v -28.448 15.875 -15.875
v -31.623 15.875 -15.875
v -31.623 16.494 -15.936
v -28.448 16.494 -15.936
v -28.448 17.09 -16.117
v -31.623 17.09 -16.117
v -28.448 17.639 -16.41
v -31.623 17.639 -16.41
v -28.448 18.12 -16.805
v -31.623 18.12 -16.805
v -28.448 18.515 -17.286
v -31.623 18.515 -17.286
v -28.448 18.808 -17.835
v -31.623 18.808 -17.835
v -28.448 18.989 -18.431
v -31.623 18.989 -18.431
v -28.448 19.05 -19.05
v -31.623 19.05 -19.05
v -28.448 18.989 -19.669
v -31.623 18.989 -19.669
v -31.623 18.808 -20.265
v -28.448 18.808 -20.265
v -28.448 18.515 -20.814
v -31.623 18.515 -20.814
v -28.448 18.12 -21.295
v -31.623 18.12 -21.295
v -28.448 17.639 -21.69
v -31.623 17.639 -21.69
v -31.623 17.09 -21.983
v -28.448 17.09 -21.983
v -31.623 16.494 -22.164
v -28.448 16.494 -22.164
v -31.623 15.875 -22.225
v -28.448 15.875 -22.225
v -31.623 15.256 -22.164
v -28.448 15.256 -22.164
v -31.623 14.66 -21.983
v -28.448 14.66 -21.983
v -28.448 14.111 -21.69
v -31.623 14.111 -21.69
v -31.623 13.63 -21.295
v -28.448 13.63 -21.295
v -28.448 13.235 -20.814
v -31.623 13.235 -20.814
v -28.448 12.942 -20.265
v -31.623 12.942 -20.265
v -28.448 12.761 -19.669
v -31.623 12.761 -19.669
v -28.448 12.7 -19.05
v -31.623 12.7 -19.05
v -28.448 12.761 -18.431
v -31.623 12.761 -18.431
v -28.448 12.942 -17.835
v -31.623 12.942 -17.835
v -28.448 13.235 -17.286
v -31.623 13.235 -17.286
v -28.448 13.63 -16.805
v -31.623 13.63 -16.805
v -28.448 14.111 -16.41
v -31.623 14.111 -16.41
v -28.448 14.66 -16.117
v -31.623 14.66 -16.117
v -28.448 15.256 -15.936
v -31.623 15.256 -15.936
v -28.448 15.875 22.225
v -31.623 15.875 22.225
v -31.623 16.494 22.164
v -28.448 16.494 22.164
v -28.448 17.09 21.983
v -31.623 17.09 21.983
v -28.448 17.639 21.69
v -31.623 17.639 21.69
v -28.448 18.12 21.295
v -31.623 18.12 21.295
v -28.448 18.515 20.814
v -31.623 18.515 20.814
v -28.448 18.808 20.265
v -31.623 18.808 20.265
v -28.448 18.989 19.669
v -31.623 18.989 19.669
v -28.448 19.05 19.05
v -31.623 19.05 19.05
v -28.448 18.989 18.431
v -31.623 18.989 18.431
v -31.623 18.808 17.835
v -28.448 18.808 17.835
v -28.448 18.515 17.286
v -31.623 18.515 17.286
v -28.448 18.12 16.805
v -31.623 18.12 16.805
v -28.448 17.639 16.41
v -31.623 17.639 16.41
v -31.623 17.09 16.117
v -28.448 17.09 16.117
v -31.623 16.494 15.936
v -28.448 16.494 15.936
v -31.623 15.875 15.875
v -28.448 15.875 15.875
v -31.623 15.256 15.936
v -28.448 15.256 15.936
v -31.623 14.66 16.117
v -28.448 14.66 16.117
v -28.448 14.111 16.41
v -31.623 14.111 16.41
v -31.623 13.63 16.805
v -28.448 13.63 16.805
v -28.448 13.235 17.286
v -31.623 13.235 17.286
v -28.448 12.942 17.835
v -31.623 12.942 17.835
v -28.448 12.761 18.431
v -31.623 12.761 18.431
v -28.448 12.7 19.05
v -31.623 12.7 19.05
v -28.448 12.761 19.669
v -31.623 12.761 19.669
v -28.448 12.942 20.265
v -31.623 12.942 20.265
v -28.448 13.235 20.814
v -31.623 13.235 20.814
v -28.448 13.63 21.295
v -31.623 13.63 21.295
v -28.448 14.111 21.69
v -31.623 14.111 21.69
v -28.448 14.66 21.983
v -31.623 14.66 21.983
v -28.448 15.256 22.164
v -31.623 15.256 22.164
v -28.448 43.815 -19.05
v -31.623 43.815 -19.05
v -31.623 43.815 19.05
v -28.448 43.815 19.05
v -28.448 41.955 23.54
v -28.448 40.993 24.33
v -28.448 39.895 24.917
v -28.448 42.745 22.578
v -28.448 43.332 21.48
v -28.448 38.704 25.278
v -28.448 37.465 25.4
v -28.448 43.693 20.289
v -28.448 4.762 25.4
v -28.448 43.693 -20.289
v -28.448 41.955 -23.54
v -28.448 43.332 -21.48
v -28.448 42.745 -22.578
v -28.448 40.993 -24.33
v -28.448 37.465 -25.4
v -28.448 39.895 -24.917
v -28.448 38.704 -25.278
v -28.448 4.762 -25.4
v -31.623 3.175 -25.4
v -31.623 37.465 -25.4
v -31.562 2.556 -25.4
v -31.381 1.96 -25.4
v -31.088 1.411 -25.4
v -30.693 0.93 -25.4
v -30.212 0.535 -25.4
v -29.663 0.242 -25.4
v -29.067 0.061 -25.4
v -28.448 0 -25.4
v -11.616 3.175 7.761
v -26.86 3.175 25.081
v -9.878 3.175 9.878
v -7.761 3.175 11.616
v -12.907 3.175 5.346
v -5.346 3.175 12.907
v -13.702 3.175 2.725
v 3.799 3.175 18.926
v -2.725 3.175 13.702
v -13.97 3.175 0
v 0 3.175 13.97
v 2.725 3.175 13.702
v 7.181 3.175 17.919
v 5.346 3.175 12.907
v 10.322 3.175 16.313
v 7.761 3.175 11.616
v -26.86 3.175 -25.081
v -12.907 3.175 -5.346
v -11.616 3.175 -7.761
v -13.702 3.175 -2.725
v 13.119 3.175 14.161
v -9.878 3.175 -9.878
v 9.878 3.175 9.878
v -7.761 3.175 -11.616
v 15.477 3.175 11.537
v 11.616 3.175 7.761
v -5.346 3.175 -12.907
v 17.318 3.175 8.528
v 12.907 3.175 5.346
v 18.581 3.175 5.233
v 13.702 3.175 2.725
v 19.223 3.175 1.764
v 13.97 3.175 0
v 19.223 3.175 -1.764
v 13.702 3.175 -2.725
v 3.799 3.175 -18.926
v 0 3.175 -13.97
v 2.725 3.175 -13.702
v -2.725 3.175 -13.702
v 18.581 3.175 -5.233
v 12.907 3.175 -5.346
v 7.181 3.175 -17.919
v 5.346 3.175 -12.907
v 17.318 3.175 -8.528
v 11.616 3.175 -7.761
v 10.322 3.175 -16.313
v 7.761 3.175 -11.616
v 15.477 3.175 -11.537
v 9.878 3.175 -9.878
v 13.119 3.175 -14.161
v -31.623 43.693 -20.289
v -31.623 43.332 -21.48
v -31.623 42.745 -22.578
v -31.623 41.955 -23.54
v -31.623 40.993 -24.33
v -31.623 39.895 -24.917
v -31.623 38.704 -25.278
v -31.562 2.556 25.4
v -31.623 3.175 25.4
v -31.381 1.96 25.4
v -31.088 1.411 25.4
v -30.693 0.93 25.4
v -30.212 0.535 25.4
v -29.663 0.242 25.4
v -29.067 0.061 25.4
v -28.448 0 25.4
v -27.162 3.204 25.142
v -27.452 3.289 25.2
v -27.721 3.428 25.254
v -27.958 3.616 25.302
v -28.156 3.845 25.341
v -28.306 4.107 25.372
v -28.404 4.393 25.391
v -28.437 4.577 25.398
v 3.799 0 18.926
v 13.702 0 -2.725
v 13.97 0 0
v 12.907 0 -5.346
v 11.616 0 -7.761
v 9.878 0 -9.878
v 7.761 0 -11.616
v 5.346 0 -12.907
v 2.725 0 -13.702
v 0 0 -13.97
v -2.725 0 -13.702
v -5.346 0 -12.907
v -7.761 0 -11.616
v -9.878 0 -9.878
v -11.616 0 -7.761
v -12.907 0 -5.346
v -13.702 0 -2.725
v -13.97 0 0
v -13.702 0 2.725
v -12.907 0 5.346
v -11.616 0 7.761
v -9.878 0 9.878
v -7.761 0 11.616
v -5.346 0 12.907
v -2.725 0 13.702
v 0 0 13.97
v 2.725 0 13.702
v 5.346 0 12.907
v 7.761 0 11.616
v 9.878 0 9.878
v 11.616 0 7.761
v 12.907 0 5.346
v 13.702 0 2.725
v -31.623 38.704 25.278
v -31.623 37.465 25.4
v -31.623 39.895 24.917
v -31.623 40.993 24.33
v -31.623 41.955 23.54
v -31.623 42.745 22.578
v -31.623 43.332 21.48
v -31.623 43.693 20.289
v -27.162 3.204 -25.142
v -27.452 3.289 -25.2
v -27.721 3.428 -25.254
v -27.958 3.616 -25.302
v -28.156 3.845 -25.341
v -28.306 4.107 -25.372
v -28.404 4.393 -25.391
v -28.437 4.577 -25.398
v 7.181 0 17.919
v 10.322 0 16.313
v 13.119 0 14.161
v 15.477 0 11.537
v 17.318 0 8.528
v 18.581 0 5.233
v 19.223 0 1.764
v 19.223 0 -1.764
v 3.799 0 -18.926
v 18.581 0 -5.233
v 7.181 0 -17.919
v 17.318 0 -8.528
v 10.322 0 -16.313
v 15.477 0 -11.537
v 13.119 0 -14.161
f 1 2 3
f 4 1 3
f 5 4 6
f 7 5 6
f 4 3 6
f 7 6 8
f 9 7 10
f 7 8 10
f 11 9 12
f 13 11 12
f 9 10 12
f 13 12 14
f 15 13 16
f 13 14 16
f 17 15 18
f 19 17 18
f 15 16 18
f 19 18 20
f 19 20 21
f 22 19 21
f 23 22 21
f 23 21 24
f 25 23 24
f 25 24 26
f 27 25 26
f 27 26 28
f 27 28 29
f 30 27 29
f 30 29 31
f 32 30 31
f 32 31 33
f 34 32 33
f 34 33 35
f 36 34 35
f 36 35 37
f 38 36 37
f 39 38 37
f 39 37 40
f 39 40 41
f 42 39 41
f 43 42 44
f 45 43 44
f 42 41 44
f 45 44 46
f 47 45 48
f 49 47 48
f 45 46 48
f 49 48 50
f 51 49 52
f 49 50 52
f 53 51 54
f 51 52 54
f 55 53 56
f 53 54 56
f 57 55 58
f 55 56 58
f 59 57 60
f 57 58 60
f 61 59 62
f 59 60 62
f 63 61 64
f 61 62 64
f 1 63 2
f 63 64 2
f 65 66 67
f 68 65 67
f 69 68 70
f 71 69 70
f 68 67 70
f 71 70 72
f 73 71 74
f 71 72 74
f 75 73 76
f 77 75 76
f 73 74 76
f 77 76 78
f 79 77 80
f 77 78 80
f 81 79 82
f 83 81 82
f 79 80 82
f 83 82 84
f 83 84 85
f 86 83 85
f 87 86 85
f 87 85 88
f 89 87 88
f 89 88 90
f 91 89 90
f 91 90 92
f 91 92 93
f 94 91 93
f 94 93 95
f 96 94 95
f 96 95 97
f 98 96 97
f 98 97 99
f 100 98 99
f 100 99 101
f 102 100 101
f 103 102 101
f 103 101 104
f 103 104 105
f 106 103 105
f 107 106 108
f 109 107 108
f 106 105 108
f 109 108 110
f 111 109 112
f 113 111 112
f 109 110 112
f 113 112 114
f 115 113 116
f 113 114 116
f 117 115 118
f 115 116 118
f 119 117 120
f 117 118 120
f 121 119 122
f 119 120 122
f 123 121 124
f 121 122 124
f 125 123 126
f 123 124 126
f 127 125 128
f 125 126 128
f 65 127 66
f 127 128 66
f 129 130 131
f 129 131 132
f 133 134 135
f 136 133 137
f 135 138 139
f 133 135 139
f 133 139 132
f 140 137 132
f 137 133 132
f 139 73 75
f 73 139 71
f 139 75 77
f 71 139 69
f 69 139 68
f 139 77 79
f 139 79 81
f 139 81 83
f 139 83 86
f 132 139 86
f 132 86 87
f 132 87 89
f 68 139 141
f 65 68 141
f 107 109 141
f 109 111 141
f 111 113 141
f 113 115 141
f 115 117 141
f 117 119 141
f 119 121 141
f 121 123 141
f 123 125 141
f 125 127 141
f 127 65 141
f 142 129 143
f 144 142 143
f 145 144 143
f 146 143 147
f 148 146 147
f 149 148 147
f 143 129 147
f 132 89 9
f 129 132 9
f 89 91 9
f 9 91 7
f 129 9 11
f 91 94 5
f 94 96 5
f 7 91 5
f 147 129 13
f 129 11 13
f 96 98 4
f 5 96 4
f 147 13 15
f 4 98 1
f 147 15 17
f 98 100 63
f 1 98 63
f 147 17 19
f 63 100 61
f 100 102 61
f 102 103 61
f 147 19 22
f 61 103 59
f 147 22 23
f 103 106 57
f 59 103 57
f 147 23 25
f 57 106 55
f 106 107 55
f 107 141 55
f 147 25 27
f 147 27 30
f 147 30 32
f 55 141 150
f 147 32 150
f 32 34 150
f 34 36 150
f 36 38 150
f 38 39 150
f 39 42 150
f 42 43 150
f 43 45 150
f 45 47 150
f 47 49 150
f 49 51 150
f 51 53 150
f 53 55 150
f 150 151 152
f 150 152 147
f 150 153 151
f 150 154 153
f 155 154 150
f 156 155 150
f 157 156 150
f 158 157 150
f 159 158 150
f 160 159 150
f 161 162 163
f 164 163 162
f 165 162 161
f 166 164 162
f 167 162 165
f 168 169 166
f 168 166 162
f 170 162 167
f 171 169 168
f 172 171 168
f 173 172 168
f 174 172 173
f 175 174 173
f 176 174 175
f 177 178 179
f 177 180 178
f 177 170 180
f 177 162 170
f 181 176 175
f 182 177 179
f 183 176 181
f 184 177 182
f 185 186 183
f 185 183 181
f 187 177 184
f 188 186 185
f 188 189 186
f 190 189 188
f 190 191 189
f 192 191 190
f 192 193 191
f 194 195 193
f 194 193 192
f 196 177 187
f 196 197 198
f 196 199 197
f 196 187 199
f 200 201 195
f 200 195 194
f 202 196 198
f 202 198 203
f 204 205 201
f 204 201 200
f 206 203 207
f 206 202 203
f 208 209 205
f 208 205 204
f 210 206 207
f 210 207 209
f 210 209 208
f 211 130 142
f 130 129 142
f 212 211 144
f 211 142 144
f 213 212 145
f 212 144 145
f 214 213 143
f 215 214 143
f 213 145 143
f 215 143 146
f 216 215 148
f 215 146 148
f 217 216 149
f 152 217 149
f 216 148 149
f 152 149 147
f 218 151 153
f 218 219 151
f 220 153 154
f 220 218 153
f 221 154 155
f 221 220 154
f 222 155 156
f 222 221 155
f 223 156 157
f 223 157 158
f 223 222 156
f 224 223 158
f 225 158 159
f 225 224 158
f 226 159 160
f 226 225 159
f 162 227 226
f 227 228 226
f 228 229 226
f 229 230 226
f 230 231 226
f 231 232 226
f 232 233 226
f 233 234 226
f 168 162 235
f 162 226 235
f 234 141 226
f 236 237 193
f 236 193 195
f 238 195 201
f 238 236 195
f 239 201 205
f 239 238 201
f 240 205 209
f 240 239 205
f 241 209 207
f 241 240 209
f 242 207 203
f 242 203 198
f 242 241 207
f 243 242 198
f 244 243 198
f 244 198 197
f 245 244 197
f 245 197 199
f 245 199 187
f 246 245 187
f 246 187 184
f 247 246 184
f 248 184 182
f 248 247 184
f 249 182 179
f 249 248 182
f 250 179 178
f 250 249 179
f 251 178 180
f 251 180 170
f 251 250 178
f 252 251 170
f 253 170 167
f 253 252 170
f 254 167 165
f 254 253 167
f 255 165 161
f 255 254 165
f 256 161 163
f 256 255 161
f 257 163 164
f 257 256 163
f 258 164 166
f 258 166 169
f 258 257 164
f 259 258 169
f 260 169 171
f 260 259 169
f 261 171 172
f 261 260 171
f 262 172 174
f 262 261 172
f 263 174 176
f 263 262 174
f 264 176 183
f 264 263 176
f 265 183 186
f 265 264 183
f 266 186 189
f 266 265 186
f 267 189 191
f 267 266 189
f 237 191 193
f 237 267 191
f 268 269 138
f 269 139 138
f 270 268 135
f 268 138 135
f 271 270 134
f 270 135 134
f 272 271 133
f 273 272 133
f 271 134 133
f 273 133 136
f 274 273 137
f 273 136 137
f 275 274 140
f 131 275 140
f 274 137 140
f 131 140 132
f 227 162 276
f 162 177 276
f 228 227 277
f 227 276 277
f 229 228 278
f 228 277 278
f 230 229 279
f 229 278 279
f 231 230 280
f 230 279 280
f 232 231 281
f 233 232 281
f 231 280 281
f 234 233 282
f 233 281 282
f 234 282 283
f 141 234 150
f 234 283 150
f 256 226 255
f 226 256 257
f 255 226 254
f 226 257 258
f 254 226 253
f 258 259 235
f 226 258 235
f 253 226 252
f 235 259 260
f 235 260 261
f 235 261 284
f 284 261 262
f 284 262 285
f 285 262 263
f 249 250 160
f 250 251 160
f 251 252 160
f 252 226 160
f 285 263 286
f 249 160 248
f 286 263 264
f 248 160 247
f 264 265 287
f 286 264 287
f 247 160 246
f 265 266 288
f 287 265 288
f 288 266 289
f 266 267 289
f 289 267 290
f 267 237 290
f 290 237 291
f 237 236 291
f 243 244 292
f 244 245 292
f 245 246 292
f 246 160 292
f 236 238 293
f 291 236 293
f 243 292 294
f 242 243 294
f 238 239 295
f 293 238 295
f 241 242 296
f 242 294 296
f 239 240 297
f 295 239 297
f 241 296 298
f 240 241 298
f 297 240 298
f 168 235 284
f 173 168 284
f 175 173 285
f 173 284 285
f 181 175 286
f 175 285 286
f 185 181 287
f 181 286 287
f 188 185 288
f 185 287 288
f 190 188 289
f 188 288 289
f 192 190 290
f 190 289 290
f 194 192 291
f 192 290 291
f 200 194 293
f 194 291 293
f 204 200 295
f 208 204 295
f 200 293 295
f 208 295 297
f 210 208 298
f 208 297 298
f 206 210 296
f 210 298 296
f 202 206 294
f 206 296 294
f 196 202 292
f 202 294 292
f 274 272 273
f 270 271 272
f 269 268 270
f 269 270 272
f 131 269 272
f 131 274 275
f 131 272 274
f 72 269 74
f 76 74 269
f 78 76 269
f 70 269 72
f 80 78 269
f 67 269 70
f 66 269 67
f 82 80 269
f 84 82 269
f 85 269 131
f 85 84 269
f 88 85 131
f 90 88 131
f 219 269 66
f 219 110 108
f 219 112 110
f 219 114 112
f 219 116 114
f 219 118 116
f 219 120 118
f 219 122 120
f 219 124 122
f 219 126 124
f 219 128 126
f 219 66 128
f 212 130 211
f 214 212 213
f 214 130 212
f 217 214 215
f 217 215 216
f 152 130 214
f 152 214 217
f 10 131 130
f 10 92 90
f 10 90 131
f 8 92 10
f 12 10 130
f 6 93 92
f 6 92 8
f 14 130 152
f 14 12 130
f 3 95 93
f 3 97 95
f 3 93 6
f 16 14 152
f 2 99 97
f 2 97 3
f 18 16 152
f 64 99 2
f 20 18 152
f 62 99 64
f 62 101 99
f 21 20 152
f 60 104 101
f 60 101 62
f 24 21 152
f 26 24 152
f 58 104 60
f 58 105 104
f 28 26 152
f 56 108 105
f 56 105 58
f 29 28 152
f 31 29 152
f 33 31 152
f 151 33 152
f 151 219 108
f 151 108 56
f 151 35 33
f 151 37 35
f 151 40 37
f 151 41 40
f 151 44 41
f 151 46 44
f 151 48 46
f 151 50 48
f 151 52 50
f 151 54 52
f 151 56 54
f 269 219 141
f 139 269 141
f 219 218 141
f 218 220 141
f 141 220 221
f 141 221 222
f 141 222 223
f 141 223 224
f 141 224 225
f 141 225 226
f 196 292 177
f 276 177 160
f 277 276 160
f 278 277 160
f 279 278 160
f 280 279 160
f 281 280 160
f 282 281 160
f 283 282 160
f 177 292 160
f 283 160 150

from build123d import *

# Parameters (mm, degrees)
SKETCH1_R           = 13.97
BOSS_EXTRUDE1_DEPTH = 3.175
SKETCH2_W           = 3.175
SKETCH2_H           = 50.8
BOSS_EXTRUDE2_DEPTH = 40.64
FILLET1_R           = 1.5875
FILLET2_R           = 3.175
SKETCH6_R           = 3.175
CUT_EXTRUDE2_DEPTH  = 51.927
FILLET3_R           = 6.35


with BuildPart() as part:
    # Sketch1 → Boss-Extrude1 (new body)
    with BuildSketch(Plane(origin=(0, 0, 0), x_dir=(1, 0, 0), z_dir=(0, 1, 0))):
        with BuildLine():
            ThreePointArc((3.799431403, -18.926403172), (19.304, 0), (3.799431403, 18.926403172))
            Line((3.799431403, 18.926403172), (-28.448, 25.4))
            Line((-28.448, 25.4), (-31.623, 25.4))
            Line((-31.623, 25.4), (-31.623, -25.4))
            Line((-31.623, -25.4), (-28.448, -25.4))
            Line((-28.448, -25.4), (3.799431403, -18.926403172))
        make_face()
        Circle(SKETCH1_R, mode=Mode.SUBTRACT)
    extrude(amount=BOSS_EXTRUDE1_DEPTH)

    # Sketch2 → Boss-Extrude2 (add)
    with BuildSketch(Plane(origin=(0, 3.175, 0), x_dir=(1, 0, 0), z_dir=(0, 1, 0))):
        with Locations((-30.0355, 0)):
            Rectangle(SKETCH2_W, SKETCH2_H)
    extrude(amount=BOSS_EXTRUDE2_DEPTH)

    # Fillet1
    fillet1_edges = [part.edges().sort_by_distance(p)[0] for p in [
        (-28.448, 3.175, 0),
    ]]
    fillet(fillet1_edges, radius=FILLET1_R)

    # Fillet2
    fillet2_edges = [part.edges().sort_by_distance(p)[0] for p in [
        (-31.623, 0, 0),
    ]]
    fillet(fillet2_edges, radius=FILLET2_R)

    # Sketch6 → Cut-Extrude2 (cut, through all)
    with BuildSketch(Plane.ZY.offset(31.623)):
        with Locations((-19.05, 15.875)):
            Circle(SKETCH6_R)
        with Locations((19.05, 15.875)):
            Circle(SKETCH6_R)
    extrude(amount=-CUT_EXTRUDE2_DEPTH, mode=Mode.SUBTRACT)

    # Fillet3
    fillet3_edges = [part.edges().sort_by_distance(p)[0] for p in [
        (-30.0355, 43.815, -25.4),
        (-30.0355, 43.815, 25.4),
    ]]
    fillet(fillet3_edges, radius=FILLET3_R)


solid = part.part
